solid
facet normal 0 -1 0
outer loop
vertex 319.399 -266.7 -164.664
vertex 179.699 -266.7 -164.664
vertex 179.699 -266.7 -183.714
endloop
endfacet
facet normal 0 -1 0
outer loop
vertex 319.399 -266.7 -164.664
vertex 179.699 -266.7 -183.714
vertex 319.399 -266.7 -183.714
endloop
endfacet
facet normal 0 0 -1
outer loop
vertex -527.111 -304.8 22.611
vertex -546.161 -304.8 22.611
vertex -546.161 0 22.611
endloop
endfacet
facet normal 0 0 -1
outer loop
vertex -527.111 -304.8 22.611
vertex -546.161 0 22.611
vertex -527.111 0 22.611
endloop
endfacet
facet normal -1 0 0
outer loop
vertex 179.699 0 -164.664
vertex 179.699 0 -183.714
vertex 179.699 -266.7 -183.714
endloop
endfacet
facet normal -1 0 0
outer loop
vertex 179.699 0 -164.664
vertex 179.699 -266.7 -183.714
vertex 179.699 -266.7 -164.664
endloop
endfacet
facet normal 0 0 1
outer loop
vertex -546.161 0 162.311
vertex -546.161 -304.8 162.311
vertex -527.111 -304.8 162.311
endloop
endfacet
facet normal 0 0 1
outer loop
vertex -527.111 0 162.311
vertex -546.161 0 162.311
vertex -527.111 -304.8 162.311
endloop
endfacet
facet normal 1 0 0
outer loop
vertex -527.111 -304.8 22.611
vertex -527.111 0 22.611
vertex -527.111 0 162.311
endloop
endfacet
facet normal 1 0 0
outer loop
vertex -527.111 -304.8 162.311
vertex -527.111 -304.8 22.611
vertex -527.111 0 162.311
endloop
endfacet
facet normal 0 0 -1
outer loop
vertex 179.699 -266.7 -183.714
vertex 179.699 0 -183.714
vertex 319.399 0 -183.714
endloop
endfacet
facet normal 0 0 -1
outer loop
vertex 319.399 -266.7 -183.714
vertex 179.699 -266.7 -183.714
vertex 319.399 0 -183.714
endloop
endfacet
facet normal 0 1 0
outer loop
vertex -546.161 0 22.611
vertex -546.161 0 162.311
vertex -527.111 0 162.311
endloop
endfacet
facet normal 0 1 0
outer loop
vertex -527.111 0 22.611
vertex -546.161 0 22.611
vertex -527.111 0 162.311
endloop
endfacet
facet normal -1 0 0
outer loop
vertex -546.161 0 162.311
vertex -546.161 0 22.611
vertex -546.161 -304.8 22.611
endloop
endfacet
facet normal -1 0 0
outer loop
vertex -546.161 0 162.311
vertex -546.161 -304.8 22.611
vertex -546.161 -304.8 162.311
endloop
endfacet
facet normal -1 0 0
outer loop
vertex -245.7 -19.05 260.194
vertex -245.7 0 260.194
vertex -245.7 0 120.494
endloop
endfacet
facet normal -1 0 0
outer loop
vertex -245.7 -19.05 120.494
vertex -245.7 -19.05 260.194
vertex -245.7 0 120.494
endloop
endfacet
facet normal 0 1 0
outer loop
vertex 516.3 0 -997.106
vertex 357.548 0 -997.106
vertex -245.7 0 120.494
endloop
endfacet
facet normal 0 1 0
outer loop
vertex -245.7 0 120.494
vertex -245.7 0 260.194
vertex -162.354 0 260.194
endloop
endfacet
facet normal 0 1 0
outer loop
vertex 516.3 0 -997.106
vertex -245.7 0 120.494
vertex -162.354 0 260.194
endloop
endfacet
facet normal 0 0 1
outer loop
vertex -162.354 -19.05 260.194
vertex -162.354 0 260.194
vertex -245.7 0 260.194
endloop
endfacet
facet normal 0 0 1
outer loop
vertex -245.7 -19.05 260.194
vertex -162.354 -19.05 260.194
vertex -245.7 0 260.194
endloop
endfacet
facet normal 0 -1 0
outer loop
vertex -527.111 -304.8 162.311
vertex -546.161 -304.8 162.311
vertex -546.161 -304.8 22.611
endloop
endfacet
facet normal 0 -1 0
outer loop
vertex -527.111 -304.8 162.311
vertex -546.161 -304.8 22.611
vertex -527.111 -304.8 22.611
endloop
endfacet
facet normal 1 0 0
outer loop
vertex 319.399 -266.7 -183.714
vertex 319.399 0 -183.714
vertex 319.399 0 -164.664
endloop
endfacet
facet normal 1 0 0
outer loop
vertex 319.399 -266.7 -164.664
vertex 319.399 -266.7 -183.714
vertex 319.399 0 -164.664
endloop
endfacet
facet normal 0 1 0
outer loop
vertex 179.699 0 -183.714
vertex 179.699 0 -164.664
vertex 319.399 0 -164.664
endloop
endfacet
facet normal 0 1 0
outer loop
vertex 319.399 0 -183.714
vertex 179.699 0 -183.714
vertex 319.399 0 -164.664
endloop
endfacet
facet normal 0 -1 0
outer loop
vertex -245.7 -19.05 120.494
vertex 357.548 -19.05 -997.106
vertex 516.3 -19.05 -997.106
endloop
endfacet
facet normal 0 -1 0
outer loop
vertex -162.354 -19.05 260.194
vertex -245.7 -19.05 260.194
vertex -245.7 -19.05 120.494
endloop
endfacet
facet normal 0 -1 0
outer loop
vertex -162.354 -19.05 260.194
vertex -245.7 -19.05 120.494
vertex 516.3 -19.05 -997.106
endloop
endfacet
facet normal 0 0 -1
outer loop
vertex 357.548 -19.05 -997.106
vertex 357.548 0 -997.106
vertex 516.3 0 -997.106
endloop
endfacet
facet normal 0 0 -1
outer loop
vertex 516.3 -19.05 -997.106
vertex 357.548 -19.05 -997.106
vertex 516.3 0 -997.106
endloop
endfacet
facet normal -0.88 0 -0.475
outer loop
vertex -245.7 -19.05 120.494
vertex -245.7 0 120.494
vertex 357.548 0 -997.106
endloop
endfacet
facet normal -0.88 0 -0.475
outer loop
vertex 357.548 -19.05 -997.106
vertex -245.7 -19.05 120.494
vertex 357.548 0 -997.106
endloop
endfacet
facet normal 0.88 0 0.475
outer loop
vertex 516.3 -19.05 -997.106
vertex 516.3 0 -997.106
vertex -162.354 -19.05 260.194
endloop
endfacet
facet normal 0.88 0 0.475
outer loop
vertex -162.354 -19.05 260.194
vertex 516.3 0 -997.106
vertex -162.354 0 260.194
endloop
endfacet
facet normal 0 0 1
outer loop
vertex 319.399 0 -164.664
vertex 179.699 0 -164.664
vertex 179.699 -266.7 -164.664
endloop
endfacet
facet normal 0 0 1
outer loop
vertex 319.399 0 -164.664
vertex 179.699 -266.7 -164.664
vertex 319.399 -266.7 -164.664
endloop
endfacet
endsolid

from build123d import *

# Parameters (mm, degrees)
F1_DEPTH = 19.05
F0_W     = 139.7
F0_H     = 19.05
F2_DEPTH = 266.7
F0_W_2   = 19.05
F0_H_2   = 139.7
F3_DEPTH = 304.8


with BuildPart() as f1:
    # F0 (on Front) → F1 (new body)
    with BuildSketch(Plane.XZ):
        Polygon((-245.699638, 260.194001), (-245.699638, 120.494001), (357.548488, -997.105999), (516.300362, -997.105999), (-162.353781, 260.194001), align=None)
    extrude(amount=F1_DEPTH)


with BuildPart() as f2:
    # F0 (on Front) → F2 (new body)
    with BuildSketch(Plane.XZ):
        with Locations((249.548959, -174.189256)):
            Rectangle(F0_W, F0_H)
    extrude(amount=F2_DEPTH)


with BuildPart() as f3:
    # F0 (on Front) → F3 (new body)
    with BuildSketch(Plane.XZ):
        with Locations((-536.635994, 92.461007)):
            Rectangle(F0_W_2, F0_H_2)
    extrude(amount=F3_DEPTH)


solid = Compound([f1.part, f2.part, f3.part])
